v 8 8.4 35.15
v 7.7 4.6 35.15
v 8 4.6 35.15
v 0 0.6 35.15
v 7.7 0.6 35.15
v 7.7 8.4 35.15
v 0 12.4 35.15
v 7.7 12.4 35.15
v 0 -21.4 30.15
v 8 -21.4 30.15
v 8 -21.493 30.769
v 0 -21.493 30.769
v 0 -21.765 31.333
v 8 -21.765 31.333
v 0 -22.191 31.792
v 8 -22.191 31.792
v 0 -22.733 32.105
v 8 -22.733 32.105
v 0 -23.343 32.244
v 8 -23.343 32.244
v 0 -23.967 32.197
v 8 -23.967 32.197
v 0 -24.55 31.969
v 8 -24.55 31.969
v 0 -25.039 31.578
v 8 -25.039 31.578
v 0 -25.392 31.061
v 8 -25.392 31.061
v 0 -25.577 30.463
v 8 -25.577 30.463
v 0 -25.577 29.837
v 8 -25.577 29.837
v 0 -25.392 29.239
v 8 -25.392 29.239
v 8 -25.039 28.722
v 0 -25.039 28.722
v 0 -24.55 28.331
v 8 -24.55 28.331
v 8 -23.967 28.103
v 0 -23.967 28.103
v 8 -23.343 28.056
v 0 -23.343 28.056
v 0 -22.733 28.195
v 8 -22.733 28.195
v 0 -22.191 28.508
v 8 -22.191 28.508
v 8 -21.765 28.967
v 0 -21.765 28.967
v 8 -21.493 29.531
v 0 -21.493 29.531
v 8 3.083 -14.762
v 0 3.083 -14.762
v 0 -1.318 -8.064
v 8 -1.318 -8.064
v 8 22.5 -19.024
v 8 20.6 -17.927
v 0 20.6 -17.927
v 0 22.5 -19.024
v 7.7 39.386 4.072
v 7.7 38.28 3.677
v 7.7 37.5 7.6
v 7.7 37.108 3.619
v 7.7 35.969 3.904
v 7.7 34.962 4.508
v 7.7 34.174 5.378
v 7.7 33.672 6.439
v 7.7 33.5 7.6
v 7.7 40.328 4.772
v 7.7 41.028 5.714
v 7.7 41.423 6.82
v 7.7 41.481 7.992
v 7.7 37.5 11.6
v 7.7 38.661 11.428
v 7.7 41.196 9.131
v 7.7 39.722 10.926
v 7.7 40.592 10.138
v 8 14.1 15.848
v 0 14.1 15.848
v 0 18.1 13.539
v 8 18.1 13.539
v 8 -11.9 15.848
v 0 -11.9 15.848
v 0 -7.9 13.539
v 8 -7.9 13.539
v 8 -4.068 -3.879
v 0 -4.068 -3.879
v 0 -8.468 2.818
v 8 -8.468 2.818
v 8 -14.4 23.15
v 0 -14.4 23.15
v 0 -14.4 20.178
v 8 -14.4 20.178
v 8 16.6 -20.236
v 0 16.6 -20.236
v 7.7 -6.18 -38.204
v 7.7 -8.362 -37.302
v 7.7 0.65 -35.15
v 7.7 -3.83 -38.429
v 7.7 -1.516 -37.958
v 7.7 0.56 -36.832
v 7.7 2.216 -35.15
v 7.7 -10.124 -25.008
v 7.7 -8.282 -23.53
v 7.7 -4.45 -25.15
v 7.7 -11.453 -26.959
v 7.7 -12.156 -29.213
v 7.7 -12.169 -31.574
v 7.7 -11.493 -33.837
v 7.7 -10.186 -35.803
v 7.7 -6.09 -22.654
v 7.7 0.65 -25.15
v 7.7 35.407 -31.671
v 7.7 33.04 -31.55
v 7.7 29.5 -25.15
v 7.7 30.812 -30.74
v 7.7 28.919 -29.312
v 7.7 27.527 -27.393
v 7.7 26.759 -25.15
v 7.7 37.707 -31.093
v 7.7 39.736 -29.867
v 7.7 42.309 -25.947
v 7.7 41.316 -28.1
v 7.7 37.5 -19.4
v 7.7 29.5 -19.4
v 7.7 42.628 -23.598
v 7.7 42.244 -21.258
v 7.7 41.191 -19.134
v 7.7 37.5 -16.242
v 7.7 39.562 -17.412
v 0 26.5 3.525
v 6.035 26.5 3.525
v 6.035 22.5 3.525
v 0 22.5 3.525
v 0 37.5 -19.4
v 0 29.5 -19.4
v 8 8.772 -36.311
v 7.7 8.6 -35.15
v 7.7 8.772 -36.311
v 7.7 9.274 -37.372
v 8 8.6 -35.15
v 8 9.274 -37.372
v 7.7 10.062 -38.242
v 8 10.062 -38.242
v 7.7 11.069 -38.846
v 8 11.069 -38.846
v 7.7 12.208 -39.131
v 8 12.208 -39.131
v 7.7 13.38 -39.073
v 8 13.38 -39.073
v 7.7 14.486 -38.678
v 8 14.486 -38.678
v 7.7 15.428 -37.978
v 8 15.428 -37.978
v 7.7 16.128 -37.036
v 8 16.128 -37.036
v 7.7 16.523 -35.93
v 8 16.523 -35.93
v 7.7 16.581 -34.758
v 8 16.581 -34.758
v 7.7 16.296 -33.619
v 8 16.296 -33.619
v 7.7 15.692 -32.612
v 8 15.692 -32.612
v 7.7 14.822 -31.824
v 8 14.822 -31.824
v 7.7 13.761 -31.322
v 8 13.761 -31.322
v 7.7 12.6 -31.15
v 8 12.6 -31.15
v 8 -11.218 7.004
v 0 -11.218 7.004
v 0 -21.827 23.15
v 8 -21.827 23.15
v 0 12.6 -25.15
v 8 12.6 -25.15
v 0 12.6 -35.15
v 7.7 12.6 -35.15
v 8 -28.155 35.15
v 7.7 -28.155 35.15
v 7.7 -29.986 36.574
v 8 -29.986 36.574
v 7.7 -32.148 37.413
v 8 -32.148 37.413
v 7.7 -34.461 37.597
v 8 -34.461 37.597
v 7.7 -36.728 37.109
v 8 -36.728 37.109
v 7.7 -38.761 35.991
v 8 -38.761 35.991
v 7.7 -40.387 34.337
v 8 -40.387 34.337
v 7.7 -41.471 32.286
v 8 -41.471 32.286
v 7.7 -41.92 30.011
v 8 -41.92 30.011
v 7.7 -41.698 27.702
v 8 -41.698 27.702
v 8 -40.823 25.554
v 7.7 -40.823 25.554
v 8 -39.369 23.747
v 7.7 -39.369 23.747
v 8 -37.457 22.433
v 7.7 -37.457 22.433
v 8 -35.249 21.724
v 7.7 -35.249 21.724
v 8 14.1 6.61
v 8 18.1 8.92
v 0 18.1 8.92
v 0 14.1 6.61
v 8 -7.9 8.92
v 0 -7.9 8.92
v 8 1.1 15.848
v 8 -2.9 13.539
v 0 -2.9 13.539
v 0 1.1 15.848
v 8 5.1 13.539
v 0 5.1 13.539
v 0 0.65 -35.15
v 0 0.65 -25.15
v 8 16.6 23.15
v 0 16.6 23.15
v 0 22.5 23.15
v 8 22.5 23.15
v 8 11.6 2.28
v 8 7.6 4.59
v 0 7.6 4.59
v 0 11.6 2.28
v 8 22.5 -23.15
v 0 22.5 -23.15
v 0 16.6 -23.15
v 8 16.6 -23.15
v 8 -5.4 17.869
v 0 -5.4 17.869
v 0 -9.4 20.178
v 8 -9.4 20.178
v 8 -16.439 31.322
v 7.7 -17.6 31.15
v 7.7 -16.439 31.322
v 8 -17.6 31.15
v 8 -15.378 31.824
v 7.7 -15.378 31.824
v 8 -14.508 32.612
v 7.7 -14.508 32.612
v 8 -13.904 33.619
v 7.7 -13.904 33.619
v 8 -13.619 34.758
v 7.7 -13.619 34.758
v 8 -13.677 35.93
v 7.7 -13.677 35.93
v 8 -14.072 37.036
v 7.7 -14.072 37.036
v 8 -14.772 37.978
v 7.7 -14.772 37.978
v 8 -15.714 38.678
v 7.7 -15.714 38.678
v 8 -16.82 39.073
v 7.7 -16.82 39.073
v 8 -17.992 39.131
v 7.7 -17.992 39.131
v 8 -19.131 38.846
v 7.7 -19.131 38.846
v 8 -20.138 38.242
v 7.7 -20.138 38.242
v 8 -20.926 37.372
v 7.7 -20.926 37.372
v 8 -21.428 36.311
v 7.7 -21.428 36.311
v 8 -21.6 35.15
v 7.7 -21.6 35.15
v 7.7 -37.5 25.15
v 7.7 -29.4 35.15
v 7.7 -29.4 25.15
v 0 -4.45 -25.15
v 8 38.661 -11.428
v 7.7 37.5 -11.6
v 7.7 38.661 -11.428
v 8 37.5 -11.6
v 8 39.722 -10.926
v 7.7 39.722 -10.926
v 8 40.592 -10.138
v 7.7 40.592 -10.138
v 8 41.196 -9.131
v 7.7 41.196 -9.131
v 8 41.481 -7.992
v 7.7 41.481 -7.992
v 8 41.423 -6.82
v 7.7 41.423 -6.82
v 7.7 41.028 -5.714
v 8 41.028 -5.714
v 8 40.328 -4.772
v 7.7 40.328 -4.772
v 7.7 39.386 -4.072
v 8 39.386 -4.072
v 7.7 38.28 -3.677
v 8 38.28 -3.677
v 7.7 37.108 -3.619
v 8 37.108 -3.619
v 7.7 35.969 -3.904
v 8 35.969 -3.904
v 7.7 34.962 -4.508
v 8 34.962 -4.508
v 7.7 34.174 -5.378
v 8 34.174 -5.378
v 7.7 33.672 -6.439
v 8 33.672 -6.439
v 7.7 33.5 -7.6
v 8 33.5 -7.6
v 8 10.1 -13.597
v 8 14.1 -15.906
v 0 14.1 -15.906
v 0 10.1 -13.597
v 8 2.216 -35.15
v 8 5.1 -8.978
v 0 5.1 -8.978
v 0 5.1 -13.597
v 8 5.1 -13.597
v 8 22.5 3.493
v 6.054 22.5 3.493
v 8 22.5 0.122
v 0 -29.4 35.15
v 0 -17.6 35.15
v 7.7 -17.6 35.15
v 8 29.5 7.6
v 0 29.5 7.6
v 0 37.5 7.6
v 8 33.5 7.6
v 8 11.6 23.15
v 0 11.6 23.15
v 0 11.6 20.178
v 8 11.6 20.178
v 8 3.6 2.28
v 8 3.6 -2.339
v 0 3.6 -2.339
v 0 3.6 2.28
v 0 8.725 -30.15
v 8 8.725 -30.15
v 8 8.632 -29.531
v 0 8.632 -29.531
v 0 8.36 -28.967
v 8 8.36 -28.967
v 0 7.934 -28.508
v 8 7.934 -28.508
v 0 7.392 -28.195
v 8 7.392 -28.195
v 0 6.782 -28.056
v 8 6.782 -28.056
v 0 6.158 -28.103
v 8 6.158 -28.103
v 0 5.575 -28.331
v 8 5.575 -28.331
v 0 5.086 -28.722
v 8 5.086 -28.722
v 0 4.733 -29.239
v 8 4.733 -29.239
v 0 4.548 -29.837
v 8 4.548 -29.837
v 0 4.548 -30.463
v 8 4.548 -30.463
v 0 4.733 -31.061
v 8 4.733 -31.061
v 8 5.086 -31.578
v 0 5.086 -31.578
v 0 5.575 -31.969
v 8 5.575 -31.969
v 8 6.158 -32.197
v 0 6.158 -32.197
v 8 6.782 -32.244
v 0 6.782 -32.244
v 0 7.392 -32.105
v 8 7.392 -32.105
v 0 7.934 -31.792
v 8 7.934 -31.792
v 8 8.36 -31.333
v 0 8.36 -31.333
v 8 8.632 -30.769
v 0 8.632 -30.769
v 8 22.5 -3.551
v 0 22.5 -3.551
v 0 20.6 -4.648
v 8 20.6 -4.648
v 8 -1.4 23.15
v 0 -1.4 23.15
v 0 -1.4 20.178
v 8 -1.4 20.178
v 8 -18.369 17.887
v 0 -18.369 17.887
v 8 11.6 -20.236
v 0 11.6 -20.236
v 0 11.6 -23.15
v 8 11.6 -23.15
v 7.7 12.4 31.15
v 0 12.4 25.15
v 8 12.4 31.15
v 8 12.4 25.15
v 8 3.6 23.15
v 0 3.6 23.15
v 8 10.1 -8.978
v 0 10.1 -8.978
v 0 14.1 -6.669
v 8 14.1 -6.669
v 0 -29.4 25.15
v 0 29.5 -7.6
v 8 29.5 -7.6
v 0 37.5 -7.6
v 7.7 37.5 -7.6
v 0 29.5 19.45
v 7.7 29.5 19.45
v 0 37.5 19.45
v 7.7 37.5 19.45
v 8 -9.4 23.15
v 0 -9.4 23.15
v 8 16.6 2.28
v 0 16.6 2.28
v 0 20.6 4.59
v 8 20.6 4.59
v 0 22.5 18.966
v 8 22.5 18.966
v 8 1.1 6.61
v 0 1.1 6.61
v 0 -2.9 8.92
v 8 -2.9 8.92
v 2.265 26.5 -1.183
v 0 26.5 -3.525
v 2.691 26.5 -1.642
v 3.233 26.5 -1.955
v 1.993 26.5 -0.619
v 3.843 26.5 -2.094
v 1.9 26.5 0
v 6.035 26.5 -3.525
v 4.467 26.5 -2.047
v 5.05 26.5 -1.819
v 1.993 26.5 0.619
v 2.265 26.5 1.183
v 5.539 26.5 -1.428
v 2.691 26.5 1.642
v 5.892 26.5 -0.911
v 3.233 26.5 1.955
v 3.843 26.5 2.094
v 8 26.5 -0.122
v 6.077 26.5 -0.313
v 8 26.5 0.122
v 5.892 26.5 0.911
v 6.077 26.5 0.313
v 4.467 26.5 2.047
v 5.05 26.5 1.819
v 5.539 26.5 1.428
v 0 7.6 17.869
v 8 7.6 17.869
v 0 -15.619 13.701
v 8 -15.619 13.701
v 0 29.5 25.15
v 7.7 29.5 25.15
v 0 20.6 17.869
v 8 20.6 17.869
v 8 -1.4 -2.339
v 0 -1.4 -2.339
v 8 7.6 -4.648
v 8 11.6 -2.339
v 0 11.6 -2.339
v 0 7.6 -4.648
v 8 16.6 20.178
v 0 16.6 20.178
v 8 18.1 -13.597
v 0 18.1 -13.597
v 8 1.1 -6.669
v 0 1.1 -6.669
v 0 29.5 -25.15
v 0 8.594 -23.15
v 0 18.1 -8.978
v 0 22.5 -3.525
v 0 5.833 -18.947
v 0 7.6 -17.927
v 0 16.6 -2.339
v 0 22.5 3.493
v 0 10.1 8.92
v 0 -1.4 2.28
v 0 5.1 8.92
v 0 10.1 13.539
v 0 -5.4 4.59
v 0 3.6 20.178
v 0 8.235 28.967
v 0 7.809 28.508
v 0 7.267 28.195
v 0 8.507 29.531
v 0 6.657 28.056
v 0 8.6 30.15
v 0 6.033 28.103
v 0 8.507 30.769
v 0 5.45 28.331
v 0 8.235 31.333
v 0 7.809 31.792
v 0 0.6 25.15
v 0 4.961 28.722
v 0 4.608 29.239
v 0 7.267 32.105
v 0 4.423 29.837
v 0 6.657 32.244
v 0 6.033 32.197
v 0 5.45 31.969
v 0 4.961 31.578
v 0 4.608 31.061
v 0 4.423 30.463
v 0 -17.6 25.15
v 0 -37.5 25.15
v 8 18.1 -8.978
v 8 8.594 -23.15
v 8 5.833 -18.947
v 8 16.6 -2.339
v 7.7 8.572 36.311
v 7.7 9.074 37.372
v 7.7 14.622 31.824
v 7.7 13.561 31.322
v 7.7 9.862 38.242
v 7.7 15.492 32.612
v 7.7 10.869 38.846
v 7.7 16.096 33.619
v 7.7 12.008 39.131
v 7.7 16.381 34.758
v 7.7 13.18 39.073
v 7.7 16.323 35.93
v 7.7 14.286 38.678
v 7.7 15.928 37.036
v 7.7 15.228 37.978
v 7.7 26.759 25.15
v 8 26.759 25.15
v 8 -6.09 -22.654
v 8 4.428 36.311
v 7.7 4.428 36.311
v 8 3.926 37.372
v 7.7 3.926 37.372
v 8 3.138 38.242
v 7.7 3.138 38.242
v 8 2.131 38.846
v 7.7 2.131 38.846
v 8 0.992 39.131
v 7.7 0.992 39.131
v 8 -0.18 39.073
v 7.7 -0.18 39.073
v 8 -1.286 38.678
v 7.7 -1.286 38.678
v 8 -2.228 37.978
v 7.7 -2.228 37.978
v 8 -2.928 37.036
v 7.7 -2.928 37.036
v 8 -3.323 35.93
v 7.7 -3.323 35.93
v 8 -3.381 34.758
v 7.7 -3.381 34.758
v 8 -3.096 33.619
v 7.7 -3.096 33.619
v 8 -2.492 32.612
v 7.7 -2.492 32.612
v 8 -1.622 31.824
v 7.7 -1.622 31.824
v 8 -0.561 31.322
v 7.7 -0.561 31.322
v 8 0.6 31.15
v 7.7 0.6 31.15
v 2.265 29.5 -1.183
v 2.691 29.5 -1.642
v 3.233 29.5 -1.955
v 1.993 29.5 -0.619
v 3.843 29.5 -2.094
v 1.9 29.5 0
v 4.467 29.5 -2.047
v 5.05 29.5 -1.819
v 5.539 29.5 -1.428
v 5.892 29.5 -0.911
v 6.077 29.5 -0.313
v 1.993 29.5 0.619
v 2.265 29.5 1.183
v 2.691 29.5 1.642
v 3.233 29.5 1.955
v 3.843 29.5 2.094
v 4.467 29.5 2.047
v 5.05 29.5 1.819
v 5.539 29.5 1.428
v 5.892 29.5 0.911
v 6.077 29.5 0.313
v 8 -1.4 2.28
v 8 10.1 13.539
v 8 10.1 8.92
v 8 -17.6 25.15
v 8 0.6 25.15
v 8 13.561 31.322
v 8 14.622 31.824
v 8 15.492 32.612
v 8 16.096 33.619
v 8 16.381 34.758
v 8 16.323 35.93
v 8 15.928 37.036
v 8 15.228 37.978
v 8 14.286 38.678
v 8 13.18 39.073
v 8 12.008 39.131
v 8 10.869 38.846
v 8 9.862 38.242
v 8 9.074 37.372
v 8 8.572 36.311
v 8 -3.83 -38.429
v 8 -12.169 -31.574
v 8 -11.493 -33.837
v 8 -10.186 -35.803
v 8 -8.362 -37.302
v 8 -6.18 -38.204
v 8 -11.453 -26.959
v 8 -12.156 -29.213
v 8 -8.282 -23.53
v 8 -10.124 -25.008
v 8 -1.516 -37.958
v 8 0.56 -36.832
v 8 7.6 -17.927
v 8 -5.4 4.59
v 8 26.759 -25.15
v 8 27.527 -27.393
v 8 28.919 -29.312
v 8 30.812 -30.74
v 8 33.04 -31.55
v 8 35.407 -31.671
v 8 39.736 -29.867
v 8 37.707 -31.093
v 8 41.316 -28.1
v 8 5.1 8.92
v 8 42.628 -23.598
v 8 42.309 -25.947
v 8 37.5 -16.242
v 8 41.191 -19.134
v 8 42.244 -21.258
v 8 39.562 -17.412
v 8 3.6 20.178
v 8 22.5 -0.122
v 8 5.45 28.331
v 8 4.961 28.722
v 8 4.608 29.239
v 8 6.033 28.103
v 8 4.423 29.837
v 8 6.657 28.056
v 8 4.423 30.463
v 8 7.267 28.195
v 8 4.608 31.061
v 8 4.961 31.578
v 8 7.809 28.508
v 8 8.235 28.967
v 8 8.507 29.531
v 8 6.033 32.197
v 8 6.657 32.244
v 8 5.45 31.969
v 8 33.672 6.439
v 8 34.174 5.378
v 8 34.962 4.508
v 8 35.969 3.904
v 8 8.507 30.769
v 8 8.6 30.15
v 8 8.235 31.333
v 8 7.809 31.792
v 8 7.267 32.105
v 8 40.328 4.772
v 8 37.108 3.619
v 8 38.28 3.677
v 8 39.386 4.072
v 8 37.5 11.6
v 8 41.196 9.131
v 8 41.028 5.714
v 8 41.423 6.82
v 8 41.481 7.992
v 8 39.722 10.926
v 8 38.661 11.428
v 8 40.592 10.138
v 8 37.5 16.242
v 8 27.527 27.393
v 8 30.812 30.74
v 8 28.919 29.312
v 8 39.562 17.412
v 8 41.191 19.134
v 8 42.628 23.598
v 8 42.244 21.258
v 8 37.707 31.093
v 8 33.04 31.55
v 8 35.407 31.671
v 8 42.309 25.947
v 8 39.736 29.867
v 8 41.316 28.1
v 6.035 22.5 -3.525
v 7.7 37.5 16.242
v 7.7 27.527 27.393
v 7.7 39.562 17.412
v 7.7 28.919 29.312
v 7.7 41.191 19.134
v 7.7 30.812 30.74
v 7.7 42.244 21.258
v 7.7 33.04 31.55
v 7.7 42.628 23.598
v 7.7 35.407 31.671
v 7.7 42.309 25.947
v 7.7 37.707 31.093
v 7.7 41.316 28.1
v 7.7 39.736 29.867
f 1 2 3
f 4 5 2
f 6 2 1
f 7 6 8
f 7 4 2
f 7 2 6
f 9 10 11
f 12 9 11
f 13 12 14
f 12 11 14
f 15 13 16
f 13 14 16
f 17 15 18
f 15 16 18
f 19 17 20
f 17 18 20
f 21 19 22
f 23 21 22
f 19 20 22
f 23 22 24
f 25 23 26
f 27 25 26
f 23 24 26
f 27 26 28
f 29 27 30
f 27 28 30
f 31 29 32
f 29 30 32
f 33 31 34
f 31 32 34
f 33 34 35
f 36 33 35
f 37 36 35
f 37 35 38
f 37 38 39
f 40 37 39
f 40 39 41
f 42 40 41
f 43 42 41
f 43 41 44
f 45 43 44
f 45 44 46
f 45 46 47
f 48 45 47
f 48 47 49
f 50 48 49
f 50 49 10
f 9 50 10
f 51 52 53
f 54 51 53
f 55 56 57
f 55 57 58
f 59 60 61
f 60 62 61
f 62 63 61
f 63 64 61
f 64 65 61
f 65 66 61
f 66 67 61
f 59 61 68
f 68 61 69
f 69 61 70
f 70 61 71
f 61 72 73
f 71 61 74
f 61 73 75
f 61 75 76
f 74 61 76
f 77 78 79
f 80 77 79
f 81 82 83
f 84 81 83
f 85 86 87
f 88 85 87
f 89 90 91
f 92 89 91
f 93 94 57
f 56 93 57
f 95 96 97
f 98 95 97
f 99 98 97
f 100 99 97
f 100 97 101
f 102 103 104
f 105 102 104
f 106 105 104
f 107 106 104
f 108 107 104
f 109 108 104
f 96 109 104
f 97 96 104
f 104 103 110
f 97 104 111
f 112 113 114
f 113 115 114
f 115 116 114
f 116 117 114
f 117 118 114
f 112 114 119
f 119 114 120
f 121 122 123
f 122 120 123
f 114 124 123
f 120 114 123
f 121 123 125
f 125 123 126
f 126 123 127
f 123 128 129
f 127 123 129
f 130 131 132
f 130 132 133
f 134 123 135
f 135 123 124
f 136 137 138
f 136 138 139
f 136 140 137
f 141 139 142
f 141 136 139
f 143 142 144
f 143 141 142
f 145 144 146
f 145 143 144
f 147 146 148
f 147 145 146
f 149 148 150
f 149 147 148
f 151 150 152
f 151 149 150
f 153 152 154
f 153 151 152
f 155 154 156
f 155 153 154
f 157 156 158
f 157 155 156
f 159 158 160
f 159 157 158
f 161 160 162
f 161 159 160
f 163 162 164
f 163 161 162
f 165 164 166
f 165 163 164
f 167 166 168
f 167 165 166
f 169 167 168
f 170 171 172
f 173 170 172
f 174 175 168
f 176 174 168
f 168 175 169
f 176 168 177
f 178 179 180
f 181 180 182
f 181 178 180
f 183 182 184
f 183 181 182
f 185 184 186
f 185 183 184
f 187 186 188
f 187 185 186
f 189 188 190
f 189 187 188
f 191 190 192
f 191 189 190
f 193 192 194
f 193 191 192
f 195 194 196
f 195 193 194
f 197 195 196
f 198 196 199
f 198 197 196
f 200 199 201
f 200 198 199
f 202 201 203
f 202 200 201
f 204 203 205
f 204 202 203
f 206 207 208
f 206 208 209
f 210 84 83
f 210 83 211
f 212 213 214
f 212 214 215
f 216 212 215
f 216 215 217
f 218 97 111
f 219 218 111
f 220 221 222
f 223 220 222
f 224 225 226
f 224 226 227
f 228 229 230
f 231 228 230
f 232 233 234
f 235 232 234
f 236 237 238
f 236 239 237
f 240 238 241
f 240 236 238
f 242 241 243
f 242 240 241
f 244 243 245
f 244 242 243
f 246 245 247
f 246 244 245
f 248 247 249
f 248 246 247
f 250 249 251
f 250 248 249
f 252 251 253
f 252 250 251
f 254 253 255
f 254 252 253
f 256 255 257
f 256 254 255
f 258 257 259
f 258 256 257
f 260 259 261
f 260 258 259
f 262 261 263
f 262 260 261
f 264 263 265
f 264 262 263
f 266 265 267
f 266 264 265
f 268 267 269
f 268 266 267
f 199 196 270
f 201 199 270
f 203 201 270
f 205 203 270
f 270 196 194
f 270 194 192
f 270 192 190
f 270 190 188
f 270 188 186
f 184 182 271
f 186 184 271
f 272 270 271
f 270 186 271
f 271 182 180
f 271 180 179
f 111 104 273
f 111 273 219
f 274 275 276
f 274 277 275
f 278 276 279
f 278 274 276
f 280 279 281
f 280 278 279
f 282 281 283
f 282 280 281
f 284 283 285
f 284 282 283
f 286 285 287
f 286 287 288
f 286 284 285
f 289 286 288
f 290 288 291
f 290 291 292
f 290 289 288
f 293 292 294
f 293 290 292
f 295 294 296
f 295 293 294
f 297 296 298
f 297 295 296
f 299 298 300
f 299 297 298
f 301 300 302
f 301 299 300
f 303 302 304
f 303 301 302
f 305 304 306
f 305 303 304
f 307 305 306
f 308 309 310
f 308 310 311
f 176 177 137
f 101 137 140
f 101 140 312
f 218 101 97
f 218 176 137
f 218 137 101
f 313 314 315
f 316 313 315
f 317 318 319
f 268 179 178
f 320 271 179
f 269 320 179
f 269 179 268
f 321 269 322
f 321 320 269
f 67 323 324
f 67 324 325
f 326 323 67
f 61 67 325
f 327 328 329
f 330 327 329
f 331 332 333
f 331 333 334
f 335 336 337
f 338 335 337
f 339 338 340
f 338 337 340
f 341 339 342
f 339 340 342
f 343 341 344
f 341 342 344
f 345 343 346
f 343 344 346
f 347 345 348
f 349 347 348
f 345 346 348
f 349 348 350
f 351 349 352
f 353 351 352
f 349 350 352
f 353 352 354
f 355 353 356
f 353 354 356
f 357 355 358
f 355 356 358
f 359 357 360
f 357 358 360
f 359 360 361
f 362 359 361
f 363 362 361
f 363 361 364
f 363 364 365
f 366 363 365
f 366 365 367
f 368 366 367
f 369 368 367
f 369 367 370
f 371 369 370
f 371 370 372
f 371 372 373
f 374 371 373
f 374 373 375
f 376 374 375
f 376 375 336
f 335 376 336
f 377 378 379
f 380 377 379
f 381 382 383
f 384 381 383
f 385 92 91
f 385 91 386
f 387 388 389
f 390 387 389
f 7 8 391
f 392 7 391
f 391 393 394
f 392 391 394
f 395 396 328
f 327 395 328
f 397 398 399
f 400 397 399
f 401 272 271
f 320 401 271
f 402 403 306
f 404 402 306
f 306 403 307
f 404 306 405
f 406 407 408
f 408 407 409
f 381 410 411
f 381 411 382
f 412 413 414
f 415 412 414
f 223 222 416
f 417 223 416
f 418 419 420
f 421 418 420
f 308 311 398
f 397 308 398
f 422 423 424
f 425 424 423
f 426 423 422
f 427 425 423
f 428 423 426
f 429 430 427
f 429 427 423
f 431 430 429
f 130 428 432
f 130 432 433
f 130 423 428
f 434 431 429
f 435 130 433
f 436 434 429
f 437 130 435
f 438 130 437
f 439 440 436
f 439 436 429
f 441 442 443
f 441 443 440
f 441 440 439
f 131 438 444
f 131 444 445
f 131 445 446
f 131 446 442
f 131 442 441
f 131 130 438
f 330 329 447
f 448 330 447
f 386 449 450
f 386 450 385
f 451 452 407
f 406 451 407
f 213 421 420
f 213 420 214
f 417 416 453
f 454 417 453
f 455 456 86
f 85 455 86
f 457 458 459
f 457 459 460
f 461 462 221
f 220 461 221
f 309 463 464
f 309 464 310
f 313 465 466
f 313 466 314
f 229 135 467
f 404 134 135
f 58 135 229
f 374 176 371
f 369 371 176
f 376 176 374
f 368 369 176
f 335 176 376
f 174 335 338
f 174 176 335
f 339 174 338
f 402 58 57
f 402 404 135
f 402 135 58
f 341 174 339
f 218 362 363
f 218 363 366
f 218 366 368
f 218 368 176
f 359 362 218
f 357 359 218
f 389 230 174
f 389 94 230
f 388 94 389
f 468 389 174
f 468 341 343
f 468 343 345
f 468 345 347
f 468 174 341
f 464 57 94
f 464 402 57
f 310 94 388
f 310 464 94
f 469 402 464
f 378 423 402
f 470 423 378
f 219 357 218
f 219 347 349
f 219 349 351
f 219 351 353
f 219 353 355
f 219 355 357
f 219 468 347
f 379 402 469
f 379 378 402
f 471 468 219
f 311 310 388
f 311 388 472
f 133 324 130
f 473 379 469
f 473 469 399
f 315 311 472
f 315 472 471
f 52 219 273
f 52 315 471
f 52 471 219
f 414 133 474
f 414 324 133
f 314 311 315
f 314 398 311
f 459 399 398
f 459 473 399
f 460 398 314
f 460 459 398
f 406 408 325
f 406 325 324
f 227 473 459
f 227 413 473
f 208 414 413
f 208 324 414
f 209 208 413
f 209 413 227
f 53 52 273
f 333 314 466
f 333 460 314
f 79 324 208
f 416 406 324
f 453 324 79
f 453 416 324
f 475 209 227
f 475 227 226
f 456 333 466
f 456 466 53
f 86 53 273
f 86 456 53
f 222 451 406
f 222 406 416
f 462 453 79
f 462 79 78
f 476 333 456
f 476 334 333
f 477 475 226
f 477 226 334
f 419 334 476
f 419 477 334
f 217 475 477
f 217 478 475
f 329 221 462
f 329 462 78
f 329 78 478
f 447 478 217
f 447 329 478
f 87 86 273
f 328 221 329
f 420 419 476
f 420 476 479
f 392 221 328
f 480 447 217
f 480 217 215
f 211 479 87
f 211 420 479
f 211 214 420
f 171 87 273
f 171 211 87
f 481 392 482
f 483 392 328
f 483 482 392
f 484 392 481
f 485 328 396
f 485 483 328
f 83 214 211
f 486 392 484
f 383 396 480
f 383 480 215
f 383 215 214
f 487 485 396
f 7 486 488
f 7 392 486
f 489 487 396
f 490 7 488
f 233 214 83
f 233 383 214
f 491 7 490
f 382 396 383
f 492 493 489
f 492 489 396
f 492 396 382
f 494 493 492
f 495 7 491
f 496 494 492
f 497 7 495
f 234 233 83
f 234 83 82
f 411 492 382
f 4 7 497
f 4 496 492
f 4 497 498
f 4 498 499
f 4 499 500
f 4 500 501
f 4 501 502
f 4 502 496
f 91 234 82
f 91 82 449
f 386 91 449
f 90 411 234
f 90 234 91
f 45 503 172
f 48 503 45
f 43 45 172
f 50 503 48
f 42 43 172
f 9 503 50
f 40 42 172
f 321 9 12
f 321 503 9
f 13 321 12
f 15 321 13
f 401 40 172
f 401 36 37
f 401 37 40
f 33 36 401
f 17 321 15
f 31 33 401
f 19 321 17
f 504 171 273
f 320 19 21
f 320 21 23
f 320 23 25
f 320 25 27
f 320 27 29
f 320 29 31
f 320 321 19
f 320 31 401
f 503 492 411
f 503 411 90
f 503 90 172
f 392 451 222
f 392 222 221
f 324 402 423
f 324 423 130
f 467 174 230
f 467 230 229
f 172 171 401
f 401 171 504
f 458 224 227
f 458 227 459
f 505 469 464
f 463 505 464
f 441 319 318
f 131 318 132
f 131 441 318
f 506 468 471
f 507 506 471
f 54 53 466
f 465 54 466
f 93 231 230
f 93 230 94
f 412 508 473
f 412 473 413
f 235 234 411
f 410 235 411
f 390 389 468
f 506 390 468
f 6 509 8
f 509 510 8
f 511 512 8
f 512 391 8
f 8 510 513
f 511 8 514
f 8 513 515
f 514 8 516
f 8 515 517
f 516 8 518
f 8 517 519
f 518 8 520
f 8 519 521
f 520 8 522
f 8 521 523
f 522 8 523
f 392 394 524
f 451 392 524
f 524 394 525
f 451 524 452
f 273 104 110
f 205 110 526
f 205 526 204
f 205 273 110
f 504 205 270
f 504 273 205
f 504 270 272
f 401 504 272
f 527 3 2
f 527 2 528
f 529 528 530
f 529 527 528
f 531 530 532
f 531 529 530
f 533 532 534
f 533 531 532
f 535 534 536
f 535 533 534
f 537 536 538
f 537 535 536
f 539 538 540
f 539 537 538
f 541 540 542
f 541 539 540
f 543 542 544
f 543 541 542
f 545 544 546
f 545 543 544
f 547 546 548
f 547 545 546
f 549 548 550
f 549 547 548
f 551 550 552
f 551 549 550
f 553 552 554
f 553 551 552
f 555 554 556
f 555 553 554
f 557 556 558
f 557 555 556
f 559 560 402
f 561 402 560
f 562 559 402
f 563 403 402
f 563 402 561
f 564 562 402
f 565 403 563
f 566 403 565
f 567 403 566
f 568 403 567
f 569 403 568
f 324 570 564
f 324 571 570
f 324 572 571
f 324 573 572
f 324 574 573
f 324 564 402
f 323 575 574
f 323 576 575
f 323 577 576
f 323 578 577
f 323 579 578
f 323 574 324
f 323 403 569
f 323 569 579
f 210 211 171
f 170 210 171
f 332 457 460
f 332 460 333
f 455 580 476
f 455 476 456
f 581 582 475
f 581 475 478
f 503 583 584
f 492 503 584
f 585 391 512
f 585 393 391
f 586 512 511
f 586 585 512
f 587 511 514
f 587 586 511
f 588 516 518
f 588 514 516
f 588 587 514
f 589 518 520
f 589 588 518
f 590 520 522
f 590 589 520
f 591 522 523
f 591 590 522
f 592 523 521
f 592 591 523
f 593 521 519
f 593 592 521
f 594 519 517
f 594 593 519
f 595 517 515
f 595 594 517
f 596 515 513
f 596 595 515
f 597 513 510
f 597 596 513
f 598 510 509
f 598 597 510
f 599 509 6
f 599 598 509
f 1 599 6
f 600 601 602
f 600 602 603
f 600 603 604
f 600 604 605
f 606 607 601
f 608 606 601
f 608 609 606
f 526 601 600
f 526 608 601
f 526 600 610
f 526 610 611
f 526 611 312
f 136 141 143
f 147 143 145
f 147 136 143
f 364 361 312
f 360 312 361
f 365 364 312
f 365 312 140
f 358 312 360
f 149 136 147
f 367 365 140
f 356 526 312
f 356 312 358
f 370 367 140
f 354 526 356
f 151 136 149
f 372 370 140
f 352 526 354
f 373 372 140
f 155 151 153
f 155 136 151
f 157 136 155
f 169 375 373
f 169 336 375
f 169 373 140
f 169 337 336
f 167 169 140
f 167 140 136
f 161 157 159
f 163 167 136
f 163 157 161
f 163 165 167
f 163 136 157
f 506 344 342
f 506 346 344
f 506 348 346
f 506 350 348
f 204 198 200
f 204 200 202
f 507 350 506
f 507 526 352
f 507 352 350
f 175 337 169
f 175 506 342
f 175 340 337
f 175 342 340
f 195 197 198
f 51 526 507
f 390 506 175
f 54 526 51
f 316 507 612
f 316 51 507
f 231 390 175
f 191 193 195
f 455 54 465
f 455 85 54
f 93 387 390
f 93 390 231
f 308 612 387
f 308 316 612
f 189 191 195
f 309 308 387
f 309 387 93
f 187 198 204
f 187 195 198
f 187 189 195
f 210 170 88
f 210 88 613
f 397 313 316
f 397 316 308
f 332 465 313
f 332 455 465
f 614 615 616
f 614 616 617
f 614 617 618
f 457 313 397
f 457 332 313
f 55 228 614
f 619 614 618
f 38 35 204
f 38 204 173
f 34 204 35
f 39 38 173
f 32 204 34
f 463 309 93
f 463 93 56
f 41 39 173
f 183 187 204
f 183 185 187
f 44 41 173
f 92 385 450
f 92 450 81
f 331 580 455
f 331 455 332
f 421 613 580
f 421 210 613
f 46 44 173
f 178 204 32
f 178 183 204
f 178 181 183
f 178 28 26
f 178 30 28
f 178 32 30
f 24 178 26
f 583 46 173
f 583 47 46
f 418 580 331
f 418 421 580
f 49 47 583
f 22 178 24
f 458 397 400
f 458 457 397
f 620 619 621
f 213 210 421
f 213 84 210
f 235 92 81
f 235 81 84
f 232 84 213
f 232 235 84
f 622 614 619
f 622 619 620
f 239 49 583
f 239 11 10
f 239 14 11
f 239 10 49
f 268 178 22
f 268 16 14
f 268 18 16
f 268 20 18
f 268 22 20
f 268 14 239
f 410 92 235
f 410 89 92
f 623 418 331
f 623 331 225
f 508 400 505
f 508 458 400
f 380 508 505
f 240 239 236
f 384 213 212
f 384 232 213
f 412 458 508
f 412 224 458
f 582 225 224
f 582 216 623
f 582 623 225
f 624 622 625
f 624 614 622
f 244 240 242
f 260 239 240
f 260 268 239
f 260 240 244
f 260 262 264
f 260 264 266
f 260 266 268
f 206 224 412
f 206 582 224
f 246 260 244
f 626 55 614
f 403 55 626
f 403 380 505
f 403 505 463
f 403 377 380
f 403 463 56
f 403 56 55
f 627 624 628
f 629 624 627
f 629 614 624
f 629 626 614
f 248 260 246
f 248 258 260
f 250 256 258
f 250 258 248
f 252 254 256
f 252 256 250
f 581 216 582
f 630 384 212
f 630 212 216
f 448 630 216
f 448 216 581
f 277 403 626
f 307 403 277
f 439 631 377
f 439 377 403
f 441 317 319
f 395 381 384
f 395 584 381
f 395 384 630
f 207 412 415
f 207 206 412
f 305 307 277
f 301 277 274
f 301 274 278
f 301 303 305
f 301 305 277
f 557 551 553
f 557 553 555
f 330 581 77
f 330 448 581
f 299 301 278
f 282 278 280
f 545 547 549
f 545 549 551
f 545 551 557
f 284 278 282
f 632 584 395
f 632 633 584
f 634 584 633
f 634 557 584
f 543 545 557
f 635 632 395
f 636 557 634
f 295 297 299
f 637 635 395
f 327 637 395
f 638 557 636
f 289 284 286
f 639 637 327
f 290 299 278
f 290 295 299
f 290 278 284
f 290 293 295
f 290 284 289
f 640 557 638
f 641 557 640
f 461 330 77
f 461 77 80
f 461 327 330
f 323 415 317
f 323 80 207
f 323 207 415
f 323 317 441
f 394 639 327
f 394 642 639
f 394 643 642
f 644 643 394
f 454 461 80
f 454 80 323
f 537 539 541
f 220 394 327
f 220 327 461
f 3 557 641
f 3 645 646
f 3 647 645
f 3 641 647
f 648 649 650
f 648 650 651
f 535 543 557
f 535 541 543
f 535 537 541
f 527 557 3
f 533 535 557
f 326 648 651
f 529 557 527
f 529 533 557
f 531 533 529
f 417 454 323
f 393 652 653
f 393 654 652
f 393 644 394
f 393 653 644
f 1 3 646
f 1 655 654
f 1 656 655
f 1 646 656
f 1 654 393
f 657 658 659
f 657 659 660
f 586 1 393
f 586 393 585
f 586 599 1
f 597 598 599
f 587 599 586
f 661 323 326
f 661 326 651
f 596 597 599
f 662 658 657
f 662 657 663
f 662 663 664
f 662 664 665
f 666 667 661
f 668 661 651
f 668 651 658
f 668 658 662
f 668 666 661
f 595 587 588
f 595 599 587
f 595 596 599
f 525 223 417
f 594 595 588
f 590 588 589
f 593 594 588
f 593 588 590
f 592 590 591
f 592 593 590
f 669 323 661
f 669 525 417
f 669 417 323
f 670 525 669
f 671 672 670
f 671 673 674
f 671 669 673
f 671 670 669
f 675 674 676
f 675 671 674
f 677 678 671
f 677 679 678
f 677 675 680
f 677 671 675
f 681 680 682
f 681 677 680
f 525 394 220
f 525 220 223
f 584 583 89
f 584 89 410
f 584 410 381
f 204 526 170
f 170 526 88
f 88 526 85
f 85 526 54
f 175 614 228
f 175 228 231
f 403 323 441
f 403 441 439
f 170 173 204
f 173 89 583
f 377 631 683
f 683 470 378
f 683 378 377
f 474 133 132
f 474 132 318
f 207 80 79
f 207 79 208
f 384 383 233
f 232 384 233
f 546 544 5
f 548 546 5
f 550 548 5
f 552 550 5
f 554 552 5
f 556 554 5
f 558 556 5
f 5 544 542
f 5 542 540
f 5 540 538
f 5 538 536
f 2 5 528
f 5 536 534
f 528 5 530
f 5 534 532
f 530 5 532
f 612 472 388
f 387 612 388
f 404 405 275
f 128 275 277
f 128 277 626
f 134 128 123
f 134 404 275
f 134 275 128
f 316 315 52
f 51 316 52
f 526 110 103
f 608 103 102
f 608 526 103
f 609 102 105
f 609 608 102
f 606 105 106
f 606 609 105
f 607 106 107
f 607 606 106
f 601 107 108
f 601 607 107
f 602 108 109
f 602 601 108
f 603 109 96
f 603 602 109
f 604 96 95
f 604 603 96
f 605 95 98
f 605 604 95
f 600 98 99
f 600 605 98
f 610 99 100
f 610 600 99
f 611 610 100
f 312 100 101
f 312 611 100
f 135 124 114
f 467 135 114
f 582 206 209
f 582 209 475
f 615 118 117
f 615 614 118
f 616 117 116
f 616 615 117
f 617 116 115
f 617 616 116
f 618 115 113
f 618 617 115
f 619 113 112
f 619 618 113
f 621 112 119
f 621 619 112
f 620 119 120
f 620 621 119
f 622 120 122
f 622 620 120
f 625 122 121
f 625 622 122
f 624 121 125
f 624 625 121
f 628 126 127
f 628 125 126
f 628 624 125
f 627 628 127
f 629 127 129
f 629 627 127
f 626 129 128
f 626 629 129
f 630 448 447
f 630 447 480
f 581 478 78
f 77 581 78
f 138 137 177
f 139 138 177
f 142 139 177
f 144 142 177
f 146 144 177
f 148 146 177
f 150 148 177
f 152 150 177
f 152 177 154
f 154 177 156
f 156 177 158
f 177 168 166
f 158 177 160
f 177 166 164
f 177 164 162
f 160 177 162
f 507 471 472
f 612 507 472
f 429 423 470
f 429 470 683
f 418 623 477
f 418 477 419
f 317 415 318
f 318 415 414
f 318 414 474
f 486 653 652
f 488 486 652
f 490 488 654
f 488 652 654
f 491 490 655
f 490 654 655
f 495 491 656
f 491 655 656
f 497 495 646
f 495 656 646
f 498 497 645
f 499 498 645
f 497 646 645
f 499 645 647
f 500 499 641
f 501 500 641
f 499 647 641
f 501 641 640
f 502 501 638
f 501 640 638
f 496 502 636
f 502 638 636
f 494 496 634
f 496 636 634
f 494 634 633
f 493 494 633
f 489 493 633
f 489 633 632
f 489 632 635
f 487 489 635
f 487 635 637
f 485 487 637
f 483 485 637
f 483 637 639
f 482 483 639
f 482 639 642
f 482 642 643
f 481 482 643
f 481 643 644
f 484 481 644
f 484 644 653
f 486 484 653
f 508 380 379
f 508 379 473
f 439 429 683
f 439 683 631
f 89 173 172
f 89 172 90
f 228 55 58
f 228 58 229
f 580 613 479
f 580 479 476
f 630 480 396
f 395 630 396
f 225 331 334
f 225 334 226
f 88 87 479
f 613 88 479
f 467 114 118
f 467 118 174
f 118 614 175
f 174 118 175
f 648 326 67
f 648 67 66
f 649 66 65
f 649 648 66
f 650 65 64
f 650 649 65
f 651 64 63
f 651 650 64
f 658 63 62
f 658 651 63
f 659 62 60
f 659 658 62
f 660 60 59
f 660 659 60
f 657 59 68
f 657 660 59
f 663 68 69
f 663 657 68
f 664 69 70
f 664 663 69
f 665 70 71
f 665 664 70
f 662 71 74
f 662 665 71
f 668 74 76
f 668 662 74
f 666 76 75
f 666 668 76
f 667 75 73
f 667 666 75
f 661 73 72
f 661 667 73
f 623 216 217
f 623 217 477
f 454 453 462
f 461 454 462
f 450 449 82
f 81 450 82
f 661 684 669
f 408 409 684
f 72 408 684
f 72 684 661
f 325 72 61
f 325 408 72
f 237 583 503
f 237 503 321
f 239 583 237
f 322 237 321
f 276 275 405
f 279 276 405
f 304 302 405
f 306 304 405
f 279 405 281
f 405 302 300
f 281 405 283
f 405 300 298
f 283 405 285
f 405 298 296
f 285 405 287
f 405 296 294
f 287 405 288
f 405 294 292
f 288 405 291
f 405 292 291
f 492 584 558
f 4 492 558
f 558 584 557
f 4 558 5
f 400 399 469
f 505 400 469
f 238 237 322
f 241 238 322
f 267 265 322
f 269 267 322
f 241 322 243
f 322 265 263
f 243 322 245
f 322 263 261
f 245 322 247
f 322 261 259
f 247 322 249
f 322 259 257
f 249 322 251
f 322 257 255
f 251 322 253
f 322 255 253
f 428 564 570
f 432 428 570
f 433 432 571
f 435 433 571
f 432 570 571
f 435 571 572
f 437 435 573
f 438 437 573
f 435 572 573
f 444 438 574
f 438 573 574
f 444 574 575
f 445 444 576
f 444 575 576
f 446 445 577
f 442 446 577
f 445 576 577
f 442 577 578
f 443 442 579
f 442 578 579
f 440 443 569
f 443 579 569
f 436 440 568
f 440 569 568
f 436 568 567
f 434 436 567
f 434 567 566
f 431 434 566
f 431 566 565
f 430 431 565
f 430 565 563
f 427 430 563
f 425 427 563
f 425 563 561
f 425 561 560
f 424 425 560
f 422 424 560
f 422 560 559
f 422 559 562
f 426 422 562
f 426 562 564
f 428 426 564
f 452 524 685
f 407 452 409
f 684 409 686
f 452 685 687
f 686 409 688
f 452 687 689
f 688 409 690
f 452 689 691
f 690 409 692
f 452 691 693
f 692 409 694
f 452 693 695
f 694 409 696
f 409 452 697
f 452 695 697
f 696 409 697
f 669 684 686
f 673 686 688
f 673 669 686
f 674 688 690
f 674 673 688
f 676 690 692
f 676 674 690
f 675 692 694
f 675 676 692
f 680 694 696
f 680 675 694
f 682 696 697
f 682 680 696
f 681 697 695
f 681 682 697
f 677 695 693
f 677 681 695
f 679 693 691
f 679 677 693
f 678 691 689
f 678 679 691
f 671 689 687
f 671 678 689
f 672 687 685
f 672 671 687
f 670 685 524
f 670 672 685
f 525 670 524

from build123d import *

# Parameters (mm, degrees)
HONEYCOMB_W      = 109
HONEYCOMB_H      = 99.592922
EXTRUDE002_DEPTH = 8
PAD002_DEPTH     = 8
PAD001_DEPTH     = 5.1
PAD_DEPTH        = 8
SKETCH001_W      = 8.1
SKETCH001_H      = 10
SKETCH001_W_2    = 18.2
SKETCH001_W_3    = 5.1
SKETCH001_W_4    = 8
SKETCH001_H_2    = 15.2
POCKET_DEPTH     = 8.001
SKETCH002_R      = 2.1
POCKET001_DEPTH  = 8.001
SKETCH004_R      = 2.1
POCKET002_DEPTH  = 7
SKETCH006_R      = 8
SKETCH006_R_2    = 4
PAD003_DEPTH     = 0.3


with BuildPart() as extrude002:
    # Honeycomb → Extrude002 (new body)
    with BuildSketch(Plane(origin=(0, 0, -0.165735), x_dir=(0, -1, 0), z_dir=(1, 0, 0))):
        with Locations((0, -0.165735)):
            Rectangle(HONEYCOMB_W, HONEYCOMB_H)
        Polygon((41.5, -37.26049), (45.5, -34.951089), (49.5, -37.26049), (49.5, -41.879292), (45.5, -44.188693), (41.5, -41.879292), align=None, mode=Mode.SUBTRACT)
        Polygon((28.5, -37.26049), (32.5, -34.951089), (36.5, -37.26049), (36.5, -41.879292), (32.5, -44.188693), (28.5, -41.879292), align=None, mode=Mode.SUBTRACT)
        Polygon((15.5, -37.26049), (19.5, -34.951089), (23.5, -37.26049), (23.5, -41.879292), (19.5, -44.188693), (15.5, -41.879292), align=None, mode=Mode.SUBTRACT)
        Polygon((2.5, -37.26049), (6.5, -34.951089), (10.5, -37.26049), (10.5, -41.879292), (6.5, -44.188693), (2.5, -41.879292), align=None, mode=Mode.SUBTRACT)
        Polygon((-10.5, -37.26049), (-6.5, -34.951089), (-2.5, -37.26049), (-2.5, -41.879292), (-6.5, -44.188693), (-10.5, -41.879292), align=None, mode=Mode.SUBTRACT)
        Polygon((-23.5, -37.26049), (-19.5, -34.951089), (-15.5, -37.26049), (-15.5, -41.879292), (-19.5, -44.188693), (-23.5, -41.879292), align=None, mode=Mode.SUBTRACT)
        Polygon((-36.5, -37.26049), (-32.5, -34.951089), (-28.5, -37.26049), (-28.5, -41.879292), (-32.5, -44.188693), (-36.5, -41.879292), align=None, mode=Mode.SUBTRACT)
        Polygon((-49.5, -37.26049), (-45.5, -34.951089), (-41.5, -37.26049), (-41.5, -41.879292), (-45.5, -44.188693), (-49.5, -41.879292), align=None, mode=Mode.SUBTRACT)
        Polygon((35, -26.00216), (39, -23.692759), (43, -26.00216), (43, -30.620962), (39, -32.930363), (35, -30.620962), align=None, mode=Mode.SUBTRACT)
        Polygon((22, -26.00216), (26, -23.692759), (30, -26.00216), (30, -30.620962), (26, -32.930363), (22, -30.620962), align=None, mode=Mode.SUBTRACT)
        Polygon((9, -26.00216), (13, -23.692759), (17, -26.00216), (17, -30.620962), (13, -32.930363), (9, -30.620962), align=None, mode=Mode.SUBTRACT)
        Polygon((-4, -26.00216), (0, -23.692759), (4, -26.00216), (4, -30.620962), (0, -32.930363), (-4, -30.620962), align=None, mode=Mode.SUBTRACT)
        Polygon((-17, -26.00216), (-13, -23.692759), (-9, -26.00216), (-9, -30.620962), (-13, -32.930363), (-17, -30.620962), align=None, mode=Mode.SUBTRACT)
        Polygon((-30, -26.00216), (-26, -23.692759), (-22, -26.00216), (-22, -30.620962), (-26, -32.930363), (-30, -30.620962), align=None, mode=Mode.SUBTRACT)
        Polygon((-43, -26.00216), (-39, -23.692759), (-35, -26.00216), (-35, -30.620962), (-39, -32.930363), (-43, -30.620962), align=None, mode=Mode.SUBTRACT)
        Polygon((41.5, -14.743829), (45.5, -12.434428), (49.5, -14.743829), (49.5, -19.362632), (45.5, -21.672033), (41.5, -19.362632), align=None, mode=Mode.SUBTRACT)
        Polygon((28.5, -14.743829), (32.5, -12.434428), (36.5, -14.743829), (36.5, -19.362632), (32.5, -21.672033), (28.5, -19.362632), align=None, mode=Mode.SUBTRACT)
        Polygon((15.5, -14.743829), (19.5, -12.434428), (23.5, -14.743829), (23.5, -19.362632), (19.5, -21.672033), (15.5, -19.362632), align=None, mode=Mode.SUBTRACT)
        Polygon((2.5, -14.743829), (6.5, -12.434428), (10.5, -14.743829), (10.5, -19.362632), (6.5, -21.672033), (2.5, -19.362632), align=None, mode=Mode.SUBTRACT)
        Polygon((-10.5, -14.743829), (-6.5, -12.434428), (-2.5, -14.743829), (-2.5, -19.362632), (-6.5, -21.672033), (-10.5, -19.362632), align=None, mode=Mode.SUBTRACT)
        Polygon((-23.5, -14.743829), (-19.5, -12.434428), (-15.5, -14.743829), (-15.5, -19.362632), (-19.5, -21.672033), (-23.5, -19.362632), align=None, mode=Mode.SUBTRACT)
        Polygon((-36.5, -14.743829), (-32.5, -12.434428), (-28.5, -14.743829), (-28.5, -19.362632), (-32.5, -21.672033), (-36.5, -19.362632), align=None, mode=Mode.SUBTRACT)
        Polygon((-49.5, -14.743829), (-45.5, -12.434428), (-41.5, -14.743829), (-41.5, -19.362632), (-45.5, -21.672033), (-49.5, -19.362632), align=None, mode=Mode.SUBTRACT)
        Polygon((35, -3.485499), (39, -1.176098), (43, -3.485499), (43, -8.104301), (39, -10.413702), (35, -8.104301), align=None, mode=Mode.SUBTRACT)
        Polygon((22, -3.485499), (26, -1.176098), (30, -3.485499), (30, -8.104301), (26, -10.413702), (22, -8.104301), align=None, mode=Mode.SUBTRACT)
        Polygon((9, -3.485499), (13, -1.176098), (17, -3.485499), (17, -8.104301), (13, -10.413702), (9, -8.104301), align=None, mode=Mode.SUBTRACT)
        Polygon((-4, -3.485499), (0, -1.176098), (4, -3.485499), (4, -8.104301), (0, -10.413702), (-4, -8.104301), align=None, mode=Mode.SUBTRACT)
        Polygon((-17, -3.485499), (-13, -1.176098), (-9, -3.485499), (-9, -8.104301), (-13, -10.413702), (-17, -8.104301), align=None, mode=Mode.SUBTRACT)
        Polygon((-30, -3.485499), (-26, -1.176098), (-22, -3.485499), (-22, -8.104301), (-26, -10.413702), (-30, -8.104301), align=None, mode=Mode.SUBTRACT)
        Polygon((-43, -3.485499), (-39, -1.176098), (-35, -3.485499), (-35, -8.104301), (-39, -10.413702), (-43, -8.104301), align=None, mode=Mode.SUBTRACT)
        Polygon((41.5, 7.772831), (45.5, 10.082232), (49.5, 7.772831), (49.5, 3.154029), (45.5, 0.844628), (41.5, 3.154029), align=None, mode=Mode.SUBTRACT)
        Polygon((28.5, 7.772831), (32.5, 10.082232), (36.5, 7.772831), (36.5, 3.154029), (32.5, 0.844628), (28.5, 3.154029), align=None, mode=Mode.SUBTRACT)
        Polygon((15.5, 7.772831), (19.5, 10.082232), (23.5, 7.772831), (23.5, 3.154029), (19.5, 0.844628), (15.5, 3.154029), align=None, mode=Mode.SUBTRACT)
        Polygon((2.5, 7.772831), (6.5, 10.082232), (10.5, 7.772831), (10.5, 3.154029), (6.5, 0.844628), (2.5, 3.154029), align=None, mode=Mode.SUBTRACT)
        Polygon((-10.5, 7.772831), (-6.5, 10.082232), (-2.5, 7.772831), (-2.5, 3.154029), (-6.5, 0.844628), (-10.5, 3.154029), align=None, mode=Mode.SUBTRACT)
        Polygon((-23.5, 7.772831), (-19.5, 10.082232), (-15.5, 7.772831), (-15.5, 3.154029), (-19.5, 0.844628), (-23.5, 3.154029), align=None, mode=Mode.SUBTRACT)
        Polygon((-36.5, 7.772831), (-32.5, 10.082232), (-28.5, 7.772831), (-28.5, 3.154029), (-32.5, 0.844628), (-36.5, 3.154029), align=None, mode=Mode.SUBTRACT)
        Polygon((-49.5, 7.772831), (-45.5, 10.082232), (-41.5, 7.772831), (-41.5, 3.154029), (-45.5, 0.844628), (-49.5, 3.154029), align=None, mode=Mode.SUBTRACT)
        Polygon((35, 19.031161), (39, 21.340562), (43, 19.031161), (43, 14.412359), (39, 12.102958), (35, 14.412359), align=None, mode=Mode.SUBTRACT)
        Polygon((22, 19.031161), (26, 21.340562), (30, 19.031161), (30, 14.412359), (26, 12.102958), (22, 14.412359), align=None, mode=Mode.SUBTRACT)
        Polygon((9, 19.031161), (13, 21.340562), (17, 19.031161), (17, 14.412359), (13, 12.102958), (9, 14.412359), align=None, mode=Mode.SUBTRACT)
        Polygon((-4, 19.031161), (0, 21.340562), (4, 19.031161), (4, 14.412359), (0, 12.102958), (-4, 14.412359), align=None, mode=Mode.SUBTRACT)
        Polygon((-17, 19.031161), (-13, 21.340562), (-9, 19.031161), (-9, 14.412359), (-13, 12.102958), (-17, 14.412359), align=None, mode=Mode.SUBTRACT)
        Polygon((-30, 19.031161), (-26, 21.340562), (-22, 19.031161), (-22, 14.412359), (-26, 12.102958), (-30, 14.412359), align=None, mode=Mode.SUBTRACT)
        Polygon((-43, 19.031161), (-39, 21.340562), (-35, 19.031161), (-35, 14.412359), (-39, 12.102958), (-43, 14.412359), align=None, mode=Mode.SUBTRACT)
        Polygon((41.5, 30.289492), (45.5, 32.598893), (49.5, 30.289492), (49.5, 25.670689), (45.5, 23.361288), (41.5, 25.670689), align=None, mode=Mode.SUBTRACT)
        Polygon((28.5, 30.289492), (32.5, 32.598893), (36.5, 30.289492), (36.5, 25.670689), (32.5, 23.361288), (28.5, 25.670689), align=None, mode=Mode.SUBTRACT)
        Polygon((15.5, 30.289492), (19.5, 32.598893), (23.5, 30.289492), (23.5, 25.670689), (19.5, 23.361288), (15.5, 25.670689), align=None, mode=Mode.SUBTRACT)
        Polygon((2.5, 30.289492), (6.5, 32.598893), (10.5, 30.289492), (10.5, 25.670689), (6.5, 23.361288), (2.5, 25.670689), align=None, mode=Mode.SUBTRACT)
        Polygon((-10.5, 30.289492), (-6.5, 32.598893), (-2.5, 30.289492), (-2.5, 25.670689), (-6.5, 23.361288), (-10.5, 25.670689), align=None, mode=Mode.SUBTRACT)
        Polygon((-23.5, 30.289492), (-19.5, 32.598893), (-15.5, 30.289492), (-15.5, 25.670689), (-19.5, 23.361288), (-23.5, 25.670689), align=None, mode=Mode.SUBTRACT)
        Polygon((-36.5, 30.289492), (-32.5, 32.598893), (-28.5, 30.289492), (-28.5, 25.670689), (-32.5, 23.361288), (-36.5, 25.670689), align=None, mode=Mode.SUBTRACT)
        Polygon((-49.5, 30.289492), (-45.5, 32.598893), (-41.5, 30.289492), (-41.5, 25.670689), (-45.5, 23.361288), (-49.5, 25.670689), align=None, mode=Mode.SUBTRACT)
        Polygon((35, 41.547822), (39, 43.857223), (43, 41.547822), (43, 36.92902), (39, 34.619619), (35, 36.92902), align=None, mode=Mode.SUBTRACT)
        Polygon((22, 41.547822), (26, 43.857223), (30, 41.547822), (30, 36.92902), (26, 34.619619), (22, 36.92902), align=None, mode=Mode.SUBTRACT)
        Polygon((9, 41.547822), (13, 43.857223), (17, 41.547822), (17, 36.92902), (13, 34.619619), (9, 36.92902), align=None, mode=Mode.SUBTRACT)
        Polygon((-4, 41.547822), (0, 43.857223), (4, 41.547822), (4, 36.92902), (0, 34.619619), (-4, 36.92902), align=None, mode=Mode.SUBTRACT)
        Polygon((-17, 41.547822), (-13, 43.857223), (-9, 41.547822), (-9, 36.92902), (-13, 34.619619), (-17, 36.92902), align=None, mode=Mode.SUBTRACT)
        Polygon((-30, 41.547822), (-26, 43.857223), (-22, 41.547822), (-22, 36.92902), (-26, 34.619619), (-30, 36.92902), align=None, mode=Mode.SUBTRACT)
        Polygon((-43, 41.547822), (-39, 43.857223), (-35, 41.547822), (-35, 36.92902), (-39, 34.619619), (-43, 36.92902), align=None, mode=Mode.SUBTRACT)
    extrude(amount=EXTRUDE002_DEPTH)


with BuildPart() as extrude002_1:
    # Extrude002 placement: moved
    add(extrude002.part.moved(Location((0, 1.1, 5.6))))


with BuildPart() as common:
    # Sketch005 → Pad002 (new body)
    with BuildSketch(Plane.YZ):
        Polygon((22.5, 23.15), (22.5, -23.15), (8.5944, -23.15), (-21.8273, 23.15), align=None)
    extrude(amount=PAD002_DEPTH)

    # Common: intersect Extrude002
    add(extrude002_1.part, mode=Mode.INTERSECT)


with BuildPart() as pad001:
    # Sketch003 → Pad001 (new body)
    with BuildSketch(Plane.XZ.offset(-26.5)):
        Polygon((1.96484, -3.525), (6.03516, -3.525), (8.070319, 0), (6.03516, 3.525), (0, 3.525), (0, -3.525), align=None)
    extrude(amount=PAD001_DEPTH)


with BuildPart() as halter_seitenwand_fraesspindel_druckbar:
    # Sketch → Pad (new body)
    with BuildSketch(Plane.YZ):
        Polygon((-37.5, 35.15), (37.5, 35.15), (37.5, -35.15), (-4.45, -35.15), (-4.45, -25.15), (-37.5, 25.15), align=None)
        Polygon((-21.827321, 23.15), (22.5, 23.15), (22.5, -23.15), (8.594449, -23.15), align=None, mode=Mode.SUBTRACT)
    extrude(amount=PAD_DEPTH)

    # Sketch001 → Pocket (cut, through all)
    with BuildSketch(Plane.YZ.offset(8)):
        with Locations((-33.45, 30.15)):
            Rectangle(SKETCH001_W, SKETCH001_H)
        with Locations((-8.5, 30.15)):
            Rectangle(SKETCH001_W_2, SKETCH001_H)
        Polygon((37.5, 35.15), (12.4, 35.15), (12.4, 25.15), (29.5, 25.15), (29.5, 19.45), (37.5, 19.45), align=None)
        with Locations((-1.9, -30.15)):
            Rectangle(SKETCH001_W_3, SKETCH001_H)
        Polygon((12.6, -35.15), (37.5, -35.15), (37.5, -25.15), (37.5, -19.4), (29.5, -19.4), (29.5, -25.15), (12.6, -25.15), align=None)
        with Locations((33.5, 0)):
            Rectangle(SKETCH001_W_4, SKETCH001_H_2)
    extrude(amount=-POCKET_DEPTH, mode=Mode.SUBTRACT)

    # Sketch002 → Pocket001 (cut, through all)
    with BuildSketch(Plane.YZ.offset(8)):
        with Locations((-23.5, 30.15)):
            Circle(SKETCH002_R)
        with Locations((6.5, 30.15)):
            Circle(SKETCH002_R)
        with Locations((6.625, -30.15)):
            Circle(SKETCH002_R)
    extrude(amount=-POCKET001_DEPTH, mode=Mode.SUBTRACT)

    # Cut: cut Pad001
    add(pad001.part, mode=Mode.SUBTRACT)

    # Sketch004 → Pocket002 (cut)
    with BuildSketch(Plane(origin=(0, 29.5, 0), x_dir=(-1, 0, 0), z_dir=(0, 1, 0))):
        with Locations((-4, 0)):
            Circle(SKETCH004_R)
    extrude(amount=-POCKET002_DEPTH, mode=Mode.SUBTRACT)

    # Fusion: union Common
    add(common.part)

    # Sketch006 → Pad003 (new body)
    with BuildSketch(Plane.YZ.offset(8)):
        with Locations((34.628638, 23.70913)):
            Circle(SKETCH006_R)
        with Locations((34.628638, -23.70913)):
            Circle(SKETCH006_R)
        with Locations((-33.930172, 29.614136)):
            Circle(SKETCH006_R)
        with Locations((-4.250326, -30.439821)):
            Circle(SKETCH006_R)
        with Locations((-17.6, 35.15)):
            Circle(SKETCH006_R_2)
        with Locations((0.6, 35.15)):
            Circle(SKETCH006_R_2)
        with Locations((12.4, 35.15)):
            Circle(SKETCH006_R_2)
        with Locations((12.6, -35.15)):
            Circle(SKETCH006_R_2)
        with Locations((37.5, 7.6)):
            Circle(SKETCH006_R_2)
        with Locations((37.5, -7.6)):
            Circle(SKETCH006_R_2)
    extrude(amount=-PAD003_DEPTH)


solid = halter_seitenwand_fraesspindel_druckbar.part
